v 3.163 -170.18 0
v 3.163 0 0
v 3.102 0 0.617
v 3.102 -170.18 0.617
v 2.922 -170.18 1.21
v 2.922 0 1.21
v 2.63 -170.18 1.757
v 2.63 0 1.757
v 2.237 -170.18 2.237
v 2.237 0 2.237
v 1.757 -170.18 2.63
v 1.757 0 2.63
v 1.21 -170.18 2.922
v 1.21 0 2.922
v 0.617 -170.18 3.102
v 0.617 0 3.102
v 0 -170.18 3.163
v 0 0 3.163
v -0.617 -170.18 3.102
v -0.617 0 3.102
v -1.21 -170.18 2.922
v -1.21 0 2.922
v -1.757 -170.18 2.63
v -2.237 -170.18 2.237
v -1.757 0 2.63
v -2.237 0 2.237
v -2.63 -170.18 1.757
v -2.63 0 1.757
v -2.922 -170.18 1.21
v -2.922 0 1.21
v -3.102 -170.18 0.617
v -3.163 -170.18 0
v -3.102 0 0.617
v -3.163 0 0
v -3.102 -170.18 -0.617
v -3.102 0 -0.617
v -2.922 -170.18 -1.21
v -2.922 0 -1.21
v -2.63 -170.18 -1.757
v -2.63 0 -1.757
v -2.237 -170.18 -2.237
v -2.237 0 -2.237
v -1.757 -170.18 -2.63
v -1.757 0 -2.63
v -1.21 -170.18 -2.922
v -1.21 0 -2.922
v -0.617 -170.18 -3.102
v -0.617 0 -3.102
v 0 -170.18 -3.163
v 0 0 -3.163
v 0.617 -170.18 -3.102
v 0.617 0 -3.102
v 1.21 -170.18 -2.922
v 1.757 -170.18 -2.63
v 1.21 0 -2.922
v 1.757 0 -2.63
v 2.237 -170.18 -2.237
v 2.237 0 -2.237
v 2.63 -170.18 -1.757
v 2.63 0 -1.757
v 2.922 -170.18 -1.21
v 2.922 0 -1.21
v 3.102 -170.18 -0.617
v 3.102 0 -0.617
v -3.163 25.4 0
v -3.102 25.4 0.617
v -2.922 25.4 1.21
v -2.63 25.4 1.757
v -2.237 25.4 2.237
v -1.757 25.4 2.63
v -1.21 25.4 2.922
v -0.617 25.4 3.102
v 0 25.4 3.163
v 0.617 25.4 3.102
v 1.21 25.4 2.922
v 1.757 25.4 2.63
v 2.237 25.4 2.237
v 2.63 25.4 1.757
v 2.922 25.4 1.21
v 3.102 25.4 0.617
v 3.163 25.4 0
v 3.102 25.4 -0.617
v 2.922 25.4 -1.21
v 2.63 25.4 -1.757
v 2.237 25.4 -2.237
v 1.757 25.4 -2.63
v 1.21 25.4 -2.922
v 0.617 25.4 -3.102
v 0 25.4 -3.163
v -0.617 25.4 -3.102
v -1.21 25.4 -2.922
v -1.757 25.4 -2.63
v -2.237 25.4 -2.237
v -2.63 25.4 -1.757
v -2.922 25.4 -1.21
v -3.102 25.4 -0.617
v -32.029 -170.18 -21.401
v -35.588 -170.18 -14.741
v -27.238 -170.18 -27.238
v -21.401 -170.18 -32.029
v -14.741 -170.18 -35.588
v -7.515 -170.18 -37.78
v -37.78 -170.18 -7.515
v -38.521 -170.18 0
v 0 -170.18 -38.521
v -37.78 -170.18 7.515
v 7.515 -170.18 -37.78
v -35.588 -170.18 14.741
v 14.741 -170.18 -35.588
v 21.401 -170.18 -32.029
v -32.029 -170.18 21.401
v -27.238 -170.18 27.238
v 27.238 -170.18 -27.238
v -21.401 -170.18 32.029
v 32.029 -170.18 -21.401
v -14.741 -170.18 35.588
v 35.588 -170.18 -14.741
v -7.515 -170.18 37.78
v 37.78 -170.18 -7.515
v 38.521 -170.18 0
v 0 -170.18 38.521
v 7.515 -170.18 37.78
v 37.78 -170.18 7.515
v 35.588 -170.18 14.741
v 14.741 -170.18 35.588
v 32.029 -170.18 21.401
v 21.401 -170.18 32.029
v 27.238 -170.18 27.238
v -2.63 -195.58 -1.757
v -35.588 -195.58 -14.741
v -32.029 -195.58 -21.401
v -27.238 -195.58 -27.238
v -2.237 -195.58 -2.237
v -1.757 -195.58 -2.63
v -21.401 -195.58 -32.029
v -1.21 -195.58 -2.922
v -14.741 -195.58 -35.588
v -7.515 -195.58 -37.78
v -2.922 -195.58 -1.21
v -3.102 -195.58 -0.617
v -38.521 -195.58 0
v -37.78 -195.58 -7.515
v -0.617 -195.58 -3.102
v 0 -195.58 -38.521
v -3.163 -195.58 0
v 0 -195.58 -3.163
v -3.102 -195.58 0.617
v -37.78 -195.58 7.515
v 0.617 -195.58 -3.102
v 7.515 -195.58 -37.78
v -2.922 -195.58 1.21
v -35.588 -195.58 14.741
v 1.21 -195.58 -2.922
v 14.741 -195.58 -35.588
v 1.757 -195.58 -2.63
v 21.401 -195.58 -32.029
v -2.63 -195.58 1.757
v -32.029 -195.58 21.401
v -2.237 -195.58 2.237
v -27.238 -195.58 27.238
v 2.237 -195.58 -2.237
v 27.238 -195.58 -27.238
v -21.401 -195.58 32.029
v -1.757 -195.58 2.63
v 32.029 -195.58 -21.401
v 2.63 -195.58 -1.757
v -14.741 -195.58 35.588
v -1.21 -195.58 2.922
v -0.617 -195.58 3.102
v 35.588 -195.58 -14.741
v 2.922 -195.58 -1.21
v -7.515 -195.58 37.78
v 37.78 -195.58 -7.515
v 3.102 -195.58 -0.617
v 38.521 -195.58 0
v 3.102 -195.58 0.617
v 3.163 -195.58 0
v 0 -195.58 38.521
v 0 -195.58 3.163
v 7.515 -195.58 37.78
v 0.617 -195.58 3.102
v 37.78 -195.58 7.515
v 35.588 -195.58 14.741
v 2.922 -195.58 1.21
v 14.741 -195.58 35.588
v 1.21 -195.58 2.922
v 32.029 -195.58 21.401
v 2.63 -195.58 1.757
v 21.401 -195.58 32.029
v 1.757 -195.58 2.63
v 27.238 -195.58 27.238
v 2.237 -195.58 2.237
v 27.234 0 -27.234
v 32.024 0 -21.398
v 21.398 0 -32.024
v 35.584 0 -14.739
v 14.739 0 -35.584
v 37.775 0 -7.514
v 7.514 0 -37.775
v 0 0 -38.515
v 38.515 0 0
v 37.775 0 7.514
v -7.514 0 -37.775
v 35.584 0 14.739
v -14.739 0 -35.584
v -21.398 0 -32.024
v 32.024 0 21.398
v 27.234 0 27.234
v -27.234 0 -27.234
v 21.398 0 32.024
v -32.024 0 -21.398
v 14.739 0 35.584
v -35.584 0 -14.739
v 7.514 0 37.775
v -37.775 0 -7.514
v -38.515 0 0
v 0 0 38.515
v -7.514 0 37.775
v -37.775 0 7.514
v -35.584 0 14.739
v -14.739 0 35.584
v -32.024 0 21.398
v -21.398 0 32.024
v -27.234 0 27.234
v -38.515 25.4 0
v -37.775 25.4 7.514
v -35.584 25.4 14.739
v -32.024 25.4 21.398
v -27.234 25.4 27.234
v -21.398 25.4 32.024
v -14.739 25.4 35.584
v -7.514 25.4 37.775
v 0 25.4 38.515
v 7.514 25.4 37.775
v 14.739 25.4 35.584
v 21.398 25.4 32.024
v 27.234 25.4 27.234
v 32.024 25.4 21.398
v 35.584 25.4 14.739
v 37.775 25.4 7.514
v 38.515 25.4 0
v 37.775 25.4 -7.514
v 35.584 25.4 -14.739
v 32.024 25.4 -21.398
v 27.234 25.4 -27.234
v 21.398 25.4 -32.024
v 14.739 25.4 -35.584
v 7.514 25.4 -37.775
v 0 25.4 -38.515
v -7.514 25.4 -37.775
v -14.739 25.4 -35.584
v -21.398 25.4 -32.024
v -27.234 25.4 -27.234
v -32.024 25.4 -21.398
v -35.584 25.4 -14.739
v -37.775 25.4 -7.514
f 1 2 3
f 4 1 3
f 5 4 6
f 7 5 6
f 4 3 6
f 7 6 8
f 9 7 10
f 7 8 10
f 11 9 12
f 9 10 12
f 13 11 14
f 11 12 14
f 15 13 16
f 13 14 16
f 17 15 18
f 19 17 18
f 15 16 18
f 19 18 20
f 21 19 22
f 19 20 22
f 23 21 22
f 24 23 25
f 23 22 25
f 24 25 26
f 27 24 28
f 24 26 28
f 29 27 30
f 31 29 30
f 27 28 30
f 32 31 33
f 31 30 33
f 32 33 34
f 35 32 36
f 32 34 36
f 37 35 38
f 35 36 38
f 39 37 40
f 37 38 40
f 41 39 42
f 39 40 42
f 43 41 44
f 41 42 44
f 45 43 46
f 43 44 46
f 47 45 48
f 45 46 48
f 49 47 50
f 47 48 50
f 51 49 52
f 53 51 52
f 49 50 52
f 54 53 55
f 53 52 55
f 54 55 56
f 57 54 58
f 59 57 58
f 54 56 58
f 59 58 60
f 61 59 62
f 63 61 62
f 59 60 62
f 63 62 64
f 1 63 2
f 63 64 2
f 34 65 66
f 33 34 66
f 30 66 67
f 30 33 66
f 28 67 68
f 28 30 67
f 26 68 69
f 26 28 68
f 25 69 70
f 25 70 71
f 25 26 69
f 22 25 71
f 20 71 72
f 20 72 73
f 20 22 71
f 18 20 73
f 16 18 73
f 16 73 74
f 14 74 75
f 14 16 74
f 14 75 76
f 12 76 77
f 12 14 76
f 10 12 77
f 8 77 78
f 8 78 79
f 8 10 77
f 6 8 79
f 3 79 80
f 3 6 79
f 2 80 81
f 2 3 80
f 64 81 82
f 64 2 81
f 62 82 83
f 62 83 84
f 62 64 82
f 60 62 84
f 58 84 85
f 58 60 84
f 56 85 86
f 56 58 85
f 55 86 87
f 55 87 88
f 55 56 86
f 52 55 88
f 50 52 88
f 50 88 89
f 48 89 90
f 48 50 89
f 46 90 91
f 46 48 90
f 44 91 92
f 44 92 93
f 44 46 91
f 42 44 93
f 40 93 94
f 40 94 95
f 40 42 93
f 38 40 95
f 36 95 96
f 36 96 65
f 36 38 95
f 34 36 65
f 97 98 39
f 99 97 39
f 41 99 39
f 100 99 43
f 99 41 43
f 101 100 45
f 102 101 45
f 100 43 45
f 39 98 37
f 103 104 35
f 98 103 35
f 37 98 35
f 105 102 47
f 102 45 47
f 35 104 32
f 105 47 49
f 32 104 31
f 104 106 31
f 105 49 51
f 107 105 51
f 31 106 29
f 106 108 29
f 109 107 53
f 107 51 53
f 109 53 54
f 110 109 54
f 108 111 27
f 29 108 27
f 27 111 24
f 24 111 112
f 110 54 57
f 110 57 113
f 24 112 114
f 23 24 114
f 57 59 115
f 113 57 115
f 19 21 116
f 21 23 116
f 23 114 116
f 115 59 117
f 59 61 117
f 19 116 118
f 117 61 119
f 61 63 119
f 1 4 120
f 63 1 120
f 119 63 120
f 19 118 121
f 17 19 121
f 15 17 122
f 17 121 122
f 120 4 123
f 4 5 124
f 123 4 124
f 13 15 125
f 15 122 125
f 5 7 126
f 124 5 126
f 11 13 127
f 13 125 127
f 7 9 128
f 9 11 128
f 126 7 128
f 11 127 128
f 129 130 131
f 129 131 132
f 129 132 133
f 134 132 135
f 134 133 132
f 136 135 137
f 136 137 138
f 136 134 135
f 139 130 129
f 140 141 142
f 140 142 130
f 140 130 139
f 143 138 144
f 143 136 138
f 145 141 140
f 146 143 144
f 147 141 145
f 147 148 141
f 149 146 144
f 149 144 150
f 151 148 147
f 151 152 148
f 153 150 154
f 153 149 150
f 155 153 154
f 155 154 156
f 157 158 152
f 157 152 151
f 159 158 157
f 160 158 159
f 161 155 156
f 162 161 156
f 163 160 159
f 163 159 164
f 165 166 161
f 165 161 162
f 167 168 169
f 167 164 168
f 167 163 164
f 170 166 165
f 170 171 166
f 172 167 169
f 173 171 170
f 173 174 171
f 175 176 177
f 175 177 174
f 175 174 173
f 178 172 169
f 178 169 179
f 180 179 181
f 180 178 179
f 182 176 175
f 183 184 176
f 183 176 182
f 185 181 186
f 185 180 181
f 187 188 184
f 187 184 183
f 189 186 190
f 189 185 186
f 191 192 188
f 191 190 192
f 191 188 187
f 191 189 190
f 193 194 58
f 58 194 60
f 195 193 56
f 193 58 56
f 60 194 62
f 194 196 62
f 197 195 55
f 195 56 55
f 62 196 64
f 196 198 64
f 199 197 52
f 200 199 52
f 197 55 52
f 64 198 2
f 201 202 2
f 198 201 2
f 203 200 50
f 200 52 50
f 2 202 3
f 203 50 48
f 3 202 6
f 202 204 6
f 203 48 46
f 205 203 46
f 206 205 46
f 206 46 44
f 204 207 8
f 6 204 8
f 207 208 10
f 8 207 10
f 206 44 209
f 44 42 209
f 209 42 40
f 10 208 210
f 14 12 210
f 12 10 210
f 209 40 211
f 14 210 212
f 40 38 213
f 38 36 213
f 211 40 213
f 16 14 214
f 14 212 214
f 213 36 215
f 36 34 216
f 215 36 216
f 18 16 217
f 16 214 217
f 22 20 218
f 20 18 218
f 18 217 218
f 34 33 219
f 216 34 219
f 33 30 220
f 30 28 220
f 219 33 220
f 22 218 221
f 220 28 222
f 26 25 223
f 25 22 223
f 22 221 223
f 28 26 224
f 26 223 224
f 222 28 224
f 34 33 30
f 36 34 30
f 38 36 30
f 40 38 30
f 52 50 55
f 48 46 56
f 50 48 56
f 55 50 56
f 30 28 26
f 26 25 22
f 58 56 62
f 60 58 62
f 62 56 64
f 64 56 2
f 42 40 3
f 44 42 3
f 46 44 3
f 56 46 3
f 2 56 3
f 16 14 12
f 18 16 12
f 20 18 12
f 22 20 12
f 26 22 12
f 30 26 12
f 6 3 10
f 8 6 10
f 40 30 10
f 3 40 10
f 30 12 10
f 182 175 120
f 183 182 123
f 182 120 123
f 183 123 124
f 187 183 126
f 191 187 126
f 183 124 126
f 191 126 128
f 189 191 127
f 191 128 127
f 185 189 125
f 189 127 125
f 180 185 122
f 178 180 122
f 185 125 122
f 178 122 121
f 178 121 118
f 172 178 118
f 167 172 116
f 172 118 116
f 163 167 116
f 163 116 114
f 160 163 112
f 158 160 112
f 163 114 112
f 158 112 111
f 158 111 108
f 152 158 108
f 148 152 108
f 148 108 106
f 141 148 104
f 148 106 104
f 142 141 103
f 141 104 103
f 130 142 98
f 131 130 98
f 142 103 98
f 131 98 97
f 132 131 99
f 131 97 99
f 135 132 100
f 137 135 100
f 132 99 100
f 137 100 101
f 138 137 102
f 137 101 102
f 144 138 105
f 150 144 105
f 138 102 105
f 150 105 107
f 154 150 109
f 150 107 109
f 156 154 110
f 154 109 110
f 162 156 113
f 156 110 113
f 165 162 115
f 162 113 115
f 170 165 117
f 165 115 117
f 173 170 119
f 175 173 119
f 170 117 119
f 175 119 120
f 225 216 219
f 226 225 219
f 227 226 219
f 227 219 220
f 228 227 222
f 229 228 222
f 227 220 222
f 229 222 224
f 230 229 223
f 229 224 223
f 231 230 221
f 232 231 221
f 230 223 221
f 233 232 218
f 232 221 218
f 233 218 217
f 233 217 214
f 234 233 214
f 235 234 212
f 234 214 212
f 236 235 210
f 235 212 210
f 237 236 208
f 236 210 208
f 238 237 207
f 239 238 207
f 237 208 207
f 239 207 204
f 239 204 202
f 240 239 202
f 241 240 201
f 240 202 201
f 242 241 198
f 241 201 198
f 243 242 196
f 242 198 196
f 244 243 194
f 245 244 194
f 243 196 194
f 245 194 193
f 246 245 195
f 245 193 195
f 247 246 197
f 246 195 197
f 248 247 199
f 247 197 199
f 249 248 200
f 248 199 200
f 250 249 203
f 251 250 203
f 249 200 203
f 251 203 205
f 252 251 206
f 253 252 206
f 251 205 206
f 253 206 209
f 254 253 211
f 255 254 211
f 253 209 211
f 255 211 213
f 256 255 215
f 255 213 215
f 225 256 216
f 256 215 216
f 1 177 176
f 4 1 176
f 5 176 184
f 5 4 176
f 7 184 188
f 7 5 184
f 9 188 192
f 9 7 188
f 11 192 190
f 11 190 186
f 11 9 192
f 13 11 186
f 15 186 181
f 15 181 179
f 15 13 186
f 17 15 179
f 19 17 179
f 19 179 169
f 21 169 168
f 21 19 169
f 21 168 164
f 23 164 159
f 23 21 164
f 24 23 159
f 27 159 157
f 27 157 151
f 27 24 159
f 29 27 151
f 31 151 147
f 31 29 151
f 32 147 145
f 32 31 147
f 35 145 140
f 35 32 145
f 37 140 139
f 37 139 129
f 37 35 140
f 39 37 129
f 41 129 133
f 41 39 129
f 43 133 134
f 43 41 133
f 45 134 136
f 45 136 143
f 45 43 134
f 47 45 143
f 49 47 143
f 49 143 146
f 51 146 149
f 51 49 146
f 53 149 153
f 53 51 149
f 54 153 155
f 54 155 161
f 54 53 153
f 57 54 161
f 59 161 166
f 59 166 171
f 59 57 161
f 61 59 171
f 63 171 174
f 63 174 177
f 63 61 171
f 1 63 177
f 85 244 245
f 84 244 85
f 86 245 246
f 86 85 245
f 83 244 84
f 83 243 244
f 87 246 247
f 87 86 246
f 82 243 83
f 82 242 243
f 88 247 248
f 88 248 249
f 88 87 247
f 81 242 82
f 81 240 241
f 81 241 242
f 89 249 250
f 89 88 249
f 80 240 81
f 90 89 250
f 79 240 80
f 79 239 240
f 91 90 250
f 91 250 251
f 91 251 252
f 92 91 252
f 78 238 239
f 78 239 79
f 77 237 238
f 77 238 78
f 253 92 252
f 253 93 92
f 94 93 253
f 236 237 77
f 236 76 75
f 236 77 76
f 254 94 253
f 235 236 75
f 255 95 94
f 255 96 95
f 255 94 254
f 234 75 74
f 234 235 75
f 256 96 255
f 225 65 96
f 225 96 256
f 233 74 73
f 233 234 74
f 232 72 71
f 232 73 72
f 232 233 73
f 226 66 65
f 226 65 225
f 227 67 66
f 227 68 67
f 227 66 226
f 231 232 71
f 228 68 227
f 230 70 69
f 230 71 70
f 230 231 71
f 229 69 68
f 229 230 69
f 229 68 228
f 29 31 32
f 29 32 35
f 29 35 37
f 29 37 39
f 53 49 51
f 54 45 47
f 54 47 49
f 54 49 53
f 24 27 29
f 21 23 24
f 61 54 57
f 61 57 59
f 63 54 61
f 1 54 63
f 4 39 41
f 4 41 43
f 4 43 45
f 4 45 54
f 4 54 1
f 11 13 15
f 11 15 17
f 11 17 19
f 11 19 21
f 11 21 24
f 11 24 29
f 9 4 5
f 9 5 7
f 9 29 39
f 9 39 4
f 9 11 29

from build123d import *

# Parameters (mm, degrees)
F0_R     = 3.1631883426
F1_DEPTH = 170.18
F3_R     = 38.5153090503
F3_R_2   = 3.1631883426
F4_DEPTH = 25.4
F2_R     = 38.5205339889
F2_R_2   = 3.1631883426
F5_DEPTH = 25.4


with BuildPart() as f1:
    # F0 (on Front) → F1 (new body)
    with BuildSketch(Plane.XZ):
        Circle(F0_R)
    extrude(amount=F1_DEPTH)


with BuildPart() as f4:
    # F3 (on face) → F4 (new body)
    with BuildSketch(Plane(origin=(0, 0, 0), x_dir=(-1, 0, 0), z_dir=(0, 1, 0))):
        Circle(F3_R)
        Circle(F3_R_2, mode=Mode.SUBTRACT)
    extrude(amount=F4_DEPTH)


with BuildPart() as f5:
    # F2 (on face) → F5 (new body)
    with BuildSketch(Plane.XZ.offset(170.18)):
        Circle(F2_R)
        Circle(F2_R_2, mode=Mode.SUBTRACT)
    extrude(amount=F5_DEPTH)


solid = Compound([f1.part, f4.part, f5.part])
